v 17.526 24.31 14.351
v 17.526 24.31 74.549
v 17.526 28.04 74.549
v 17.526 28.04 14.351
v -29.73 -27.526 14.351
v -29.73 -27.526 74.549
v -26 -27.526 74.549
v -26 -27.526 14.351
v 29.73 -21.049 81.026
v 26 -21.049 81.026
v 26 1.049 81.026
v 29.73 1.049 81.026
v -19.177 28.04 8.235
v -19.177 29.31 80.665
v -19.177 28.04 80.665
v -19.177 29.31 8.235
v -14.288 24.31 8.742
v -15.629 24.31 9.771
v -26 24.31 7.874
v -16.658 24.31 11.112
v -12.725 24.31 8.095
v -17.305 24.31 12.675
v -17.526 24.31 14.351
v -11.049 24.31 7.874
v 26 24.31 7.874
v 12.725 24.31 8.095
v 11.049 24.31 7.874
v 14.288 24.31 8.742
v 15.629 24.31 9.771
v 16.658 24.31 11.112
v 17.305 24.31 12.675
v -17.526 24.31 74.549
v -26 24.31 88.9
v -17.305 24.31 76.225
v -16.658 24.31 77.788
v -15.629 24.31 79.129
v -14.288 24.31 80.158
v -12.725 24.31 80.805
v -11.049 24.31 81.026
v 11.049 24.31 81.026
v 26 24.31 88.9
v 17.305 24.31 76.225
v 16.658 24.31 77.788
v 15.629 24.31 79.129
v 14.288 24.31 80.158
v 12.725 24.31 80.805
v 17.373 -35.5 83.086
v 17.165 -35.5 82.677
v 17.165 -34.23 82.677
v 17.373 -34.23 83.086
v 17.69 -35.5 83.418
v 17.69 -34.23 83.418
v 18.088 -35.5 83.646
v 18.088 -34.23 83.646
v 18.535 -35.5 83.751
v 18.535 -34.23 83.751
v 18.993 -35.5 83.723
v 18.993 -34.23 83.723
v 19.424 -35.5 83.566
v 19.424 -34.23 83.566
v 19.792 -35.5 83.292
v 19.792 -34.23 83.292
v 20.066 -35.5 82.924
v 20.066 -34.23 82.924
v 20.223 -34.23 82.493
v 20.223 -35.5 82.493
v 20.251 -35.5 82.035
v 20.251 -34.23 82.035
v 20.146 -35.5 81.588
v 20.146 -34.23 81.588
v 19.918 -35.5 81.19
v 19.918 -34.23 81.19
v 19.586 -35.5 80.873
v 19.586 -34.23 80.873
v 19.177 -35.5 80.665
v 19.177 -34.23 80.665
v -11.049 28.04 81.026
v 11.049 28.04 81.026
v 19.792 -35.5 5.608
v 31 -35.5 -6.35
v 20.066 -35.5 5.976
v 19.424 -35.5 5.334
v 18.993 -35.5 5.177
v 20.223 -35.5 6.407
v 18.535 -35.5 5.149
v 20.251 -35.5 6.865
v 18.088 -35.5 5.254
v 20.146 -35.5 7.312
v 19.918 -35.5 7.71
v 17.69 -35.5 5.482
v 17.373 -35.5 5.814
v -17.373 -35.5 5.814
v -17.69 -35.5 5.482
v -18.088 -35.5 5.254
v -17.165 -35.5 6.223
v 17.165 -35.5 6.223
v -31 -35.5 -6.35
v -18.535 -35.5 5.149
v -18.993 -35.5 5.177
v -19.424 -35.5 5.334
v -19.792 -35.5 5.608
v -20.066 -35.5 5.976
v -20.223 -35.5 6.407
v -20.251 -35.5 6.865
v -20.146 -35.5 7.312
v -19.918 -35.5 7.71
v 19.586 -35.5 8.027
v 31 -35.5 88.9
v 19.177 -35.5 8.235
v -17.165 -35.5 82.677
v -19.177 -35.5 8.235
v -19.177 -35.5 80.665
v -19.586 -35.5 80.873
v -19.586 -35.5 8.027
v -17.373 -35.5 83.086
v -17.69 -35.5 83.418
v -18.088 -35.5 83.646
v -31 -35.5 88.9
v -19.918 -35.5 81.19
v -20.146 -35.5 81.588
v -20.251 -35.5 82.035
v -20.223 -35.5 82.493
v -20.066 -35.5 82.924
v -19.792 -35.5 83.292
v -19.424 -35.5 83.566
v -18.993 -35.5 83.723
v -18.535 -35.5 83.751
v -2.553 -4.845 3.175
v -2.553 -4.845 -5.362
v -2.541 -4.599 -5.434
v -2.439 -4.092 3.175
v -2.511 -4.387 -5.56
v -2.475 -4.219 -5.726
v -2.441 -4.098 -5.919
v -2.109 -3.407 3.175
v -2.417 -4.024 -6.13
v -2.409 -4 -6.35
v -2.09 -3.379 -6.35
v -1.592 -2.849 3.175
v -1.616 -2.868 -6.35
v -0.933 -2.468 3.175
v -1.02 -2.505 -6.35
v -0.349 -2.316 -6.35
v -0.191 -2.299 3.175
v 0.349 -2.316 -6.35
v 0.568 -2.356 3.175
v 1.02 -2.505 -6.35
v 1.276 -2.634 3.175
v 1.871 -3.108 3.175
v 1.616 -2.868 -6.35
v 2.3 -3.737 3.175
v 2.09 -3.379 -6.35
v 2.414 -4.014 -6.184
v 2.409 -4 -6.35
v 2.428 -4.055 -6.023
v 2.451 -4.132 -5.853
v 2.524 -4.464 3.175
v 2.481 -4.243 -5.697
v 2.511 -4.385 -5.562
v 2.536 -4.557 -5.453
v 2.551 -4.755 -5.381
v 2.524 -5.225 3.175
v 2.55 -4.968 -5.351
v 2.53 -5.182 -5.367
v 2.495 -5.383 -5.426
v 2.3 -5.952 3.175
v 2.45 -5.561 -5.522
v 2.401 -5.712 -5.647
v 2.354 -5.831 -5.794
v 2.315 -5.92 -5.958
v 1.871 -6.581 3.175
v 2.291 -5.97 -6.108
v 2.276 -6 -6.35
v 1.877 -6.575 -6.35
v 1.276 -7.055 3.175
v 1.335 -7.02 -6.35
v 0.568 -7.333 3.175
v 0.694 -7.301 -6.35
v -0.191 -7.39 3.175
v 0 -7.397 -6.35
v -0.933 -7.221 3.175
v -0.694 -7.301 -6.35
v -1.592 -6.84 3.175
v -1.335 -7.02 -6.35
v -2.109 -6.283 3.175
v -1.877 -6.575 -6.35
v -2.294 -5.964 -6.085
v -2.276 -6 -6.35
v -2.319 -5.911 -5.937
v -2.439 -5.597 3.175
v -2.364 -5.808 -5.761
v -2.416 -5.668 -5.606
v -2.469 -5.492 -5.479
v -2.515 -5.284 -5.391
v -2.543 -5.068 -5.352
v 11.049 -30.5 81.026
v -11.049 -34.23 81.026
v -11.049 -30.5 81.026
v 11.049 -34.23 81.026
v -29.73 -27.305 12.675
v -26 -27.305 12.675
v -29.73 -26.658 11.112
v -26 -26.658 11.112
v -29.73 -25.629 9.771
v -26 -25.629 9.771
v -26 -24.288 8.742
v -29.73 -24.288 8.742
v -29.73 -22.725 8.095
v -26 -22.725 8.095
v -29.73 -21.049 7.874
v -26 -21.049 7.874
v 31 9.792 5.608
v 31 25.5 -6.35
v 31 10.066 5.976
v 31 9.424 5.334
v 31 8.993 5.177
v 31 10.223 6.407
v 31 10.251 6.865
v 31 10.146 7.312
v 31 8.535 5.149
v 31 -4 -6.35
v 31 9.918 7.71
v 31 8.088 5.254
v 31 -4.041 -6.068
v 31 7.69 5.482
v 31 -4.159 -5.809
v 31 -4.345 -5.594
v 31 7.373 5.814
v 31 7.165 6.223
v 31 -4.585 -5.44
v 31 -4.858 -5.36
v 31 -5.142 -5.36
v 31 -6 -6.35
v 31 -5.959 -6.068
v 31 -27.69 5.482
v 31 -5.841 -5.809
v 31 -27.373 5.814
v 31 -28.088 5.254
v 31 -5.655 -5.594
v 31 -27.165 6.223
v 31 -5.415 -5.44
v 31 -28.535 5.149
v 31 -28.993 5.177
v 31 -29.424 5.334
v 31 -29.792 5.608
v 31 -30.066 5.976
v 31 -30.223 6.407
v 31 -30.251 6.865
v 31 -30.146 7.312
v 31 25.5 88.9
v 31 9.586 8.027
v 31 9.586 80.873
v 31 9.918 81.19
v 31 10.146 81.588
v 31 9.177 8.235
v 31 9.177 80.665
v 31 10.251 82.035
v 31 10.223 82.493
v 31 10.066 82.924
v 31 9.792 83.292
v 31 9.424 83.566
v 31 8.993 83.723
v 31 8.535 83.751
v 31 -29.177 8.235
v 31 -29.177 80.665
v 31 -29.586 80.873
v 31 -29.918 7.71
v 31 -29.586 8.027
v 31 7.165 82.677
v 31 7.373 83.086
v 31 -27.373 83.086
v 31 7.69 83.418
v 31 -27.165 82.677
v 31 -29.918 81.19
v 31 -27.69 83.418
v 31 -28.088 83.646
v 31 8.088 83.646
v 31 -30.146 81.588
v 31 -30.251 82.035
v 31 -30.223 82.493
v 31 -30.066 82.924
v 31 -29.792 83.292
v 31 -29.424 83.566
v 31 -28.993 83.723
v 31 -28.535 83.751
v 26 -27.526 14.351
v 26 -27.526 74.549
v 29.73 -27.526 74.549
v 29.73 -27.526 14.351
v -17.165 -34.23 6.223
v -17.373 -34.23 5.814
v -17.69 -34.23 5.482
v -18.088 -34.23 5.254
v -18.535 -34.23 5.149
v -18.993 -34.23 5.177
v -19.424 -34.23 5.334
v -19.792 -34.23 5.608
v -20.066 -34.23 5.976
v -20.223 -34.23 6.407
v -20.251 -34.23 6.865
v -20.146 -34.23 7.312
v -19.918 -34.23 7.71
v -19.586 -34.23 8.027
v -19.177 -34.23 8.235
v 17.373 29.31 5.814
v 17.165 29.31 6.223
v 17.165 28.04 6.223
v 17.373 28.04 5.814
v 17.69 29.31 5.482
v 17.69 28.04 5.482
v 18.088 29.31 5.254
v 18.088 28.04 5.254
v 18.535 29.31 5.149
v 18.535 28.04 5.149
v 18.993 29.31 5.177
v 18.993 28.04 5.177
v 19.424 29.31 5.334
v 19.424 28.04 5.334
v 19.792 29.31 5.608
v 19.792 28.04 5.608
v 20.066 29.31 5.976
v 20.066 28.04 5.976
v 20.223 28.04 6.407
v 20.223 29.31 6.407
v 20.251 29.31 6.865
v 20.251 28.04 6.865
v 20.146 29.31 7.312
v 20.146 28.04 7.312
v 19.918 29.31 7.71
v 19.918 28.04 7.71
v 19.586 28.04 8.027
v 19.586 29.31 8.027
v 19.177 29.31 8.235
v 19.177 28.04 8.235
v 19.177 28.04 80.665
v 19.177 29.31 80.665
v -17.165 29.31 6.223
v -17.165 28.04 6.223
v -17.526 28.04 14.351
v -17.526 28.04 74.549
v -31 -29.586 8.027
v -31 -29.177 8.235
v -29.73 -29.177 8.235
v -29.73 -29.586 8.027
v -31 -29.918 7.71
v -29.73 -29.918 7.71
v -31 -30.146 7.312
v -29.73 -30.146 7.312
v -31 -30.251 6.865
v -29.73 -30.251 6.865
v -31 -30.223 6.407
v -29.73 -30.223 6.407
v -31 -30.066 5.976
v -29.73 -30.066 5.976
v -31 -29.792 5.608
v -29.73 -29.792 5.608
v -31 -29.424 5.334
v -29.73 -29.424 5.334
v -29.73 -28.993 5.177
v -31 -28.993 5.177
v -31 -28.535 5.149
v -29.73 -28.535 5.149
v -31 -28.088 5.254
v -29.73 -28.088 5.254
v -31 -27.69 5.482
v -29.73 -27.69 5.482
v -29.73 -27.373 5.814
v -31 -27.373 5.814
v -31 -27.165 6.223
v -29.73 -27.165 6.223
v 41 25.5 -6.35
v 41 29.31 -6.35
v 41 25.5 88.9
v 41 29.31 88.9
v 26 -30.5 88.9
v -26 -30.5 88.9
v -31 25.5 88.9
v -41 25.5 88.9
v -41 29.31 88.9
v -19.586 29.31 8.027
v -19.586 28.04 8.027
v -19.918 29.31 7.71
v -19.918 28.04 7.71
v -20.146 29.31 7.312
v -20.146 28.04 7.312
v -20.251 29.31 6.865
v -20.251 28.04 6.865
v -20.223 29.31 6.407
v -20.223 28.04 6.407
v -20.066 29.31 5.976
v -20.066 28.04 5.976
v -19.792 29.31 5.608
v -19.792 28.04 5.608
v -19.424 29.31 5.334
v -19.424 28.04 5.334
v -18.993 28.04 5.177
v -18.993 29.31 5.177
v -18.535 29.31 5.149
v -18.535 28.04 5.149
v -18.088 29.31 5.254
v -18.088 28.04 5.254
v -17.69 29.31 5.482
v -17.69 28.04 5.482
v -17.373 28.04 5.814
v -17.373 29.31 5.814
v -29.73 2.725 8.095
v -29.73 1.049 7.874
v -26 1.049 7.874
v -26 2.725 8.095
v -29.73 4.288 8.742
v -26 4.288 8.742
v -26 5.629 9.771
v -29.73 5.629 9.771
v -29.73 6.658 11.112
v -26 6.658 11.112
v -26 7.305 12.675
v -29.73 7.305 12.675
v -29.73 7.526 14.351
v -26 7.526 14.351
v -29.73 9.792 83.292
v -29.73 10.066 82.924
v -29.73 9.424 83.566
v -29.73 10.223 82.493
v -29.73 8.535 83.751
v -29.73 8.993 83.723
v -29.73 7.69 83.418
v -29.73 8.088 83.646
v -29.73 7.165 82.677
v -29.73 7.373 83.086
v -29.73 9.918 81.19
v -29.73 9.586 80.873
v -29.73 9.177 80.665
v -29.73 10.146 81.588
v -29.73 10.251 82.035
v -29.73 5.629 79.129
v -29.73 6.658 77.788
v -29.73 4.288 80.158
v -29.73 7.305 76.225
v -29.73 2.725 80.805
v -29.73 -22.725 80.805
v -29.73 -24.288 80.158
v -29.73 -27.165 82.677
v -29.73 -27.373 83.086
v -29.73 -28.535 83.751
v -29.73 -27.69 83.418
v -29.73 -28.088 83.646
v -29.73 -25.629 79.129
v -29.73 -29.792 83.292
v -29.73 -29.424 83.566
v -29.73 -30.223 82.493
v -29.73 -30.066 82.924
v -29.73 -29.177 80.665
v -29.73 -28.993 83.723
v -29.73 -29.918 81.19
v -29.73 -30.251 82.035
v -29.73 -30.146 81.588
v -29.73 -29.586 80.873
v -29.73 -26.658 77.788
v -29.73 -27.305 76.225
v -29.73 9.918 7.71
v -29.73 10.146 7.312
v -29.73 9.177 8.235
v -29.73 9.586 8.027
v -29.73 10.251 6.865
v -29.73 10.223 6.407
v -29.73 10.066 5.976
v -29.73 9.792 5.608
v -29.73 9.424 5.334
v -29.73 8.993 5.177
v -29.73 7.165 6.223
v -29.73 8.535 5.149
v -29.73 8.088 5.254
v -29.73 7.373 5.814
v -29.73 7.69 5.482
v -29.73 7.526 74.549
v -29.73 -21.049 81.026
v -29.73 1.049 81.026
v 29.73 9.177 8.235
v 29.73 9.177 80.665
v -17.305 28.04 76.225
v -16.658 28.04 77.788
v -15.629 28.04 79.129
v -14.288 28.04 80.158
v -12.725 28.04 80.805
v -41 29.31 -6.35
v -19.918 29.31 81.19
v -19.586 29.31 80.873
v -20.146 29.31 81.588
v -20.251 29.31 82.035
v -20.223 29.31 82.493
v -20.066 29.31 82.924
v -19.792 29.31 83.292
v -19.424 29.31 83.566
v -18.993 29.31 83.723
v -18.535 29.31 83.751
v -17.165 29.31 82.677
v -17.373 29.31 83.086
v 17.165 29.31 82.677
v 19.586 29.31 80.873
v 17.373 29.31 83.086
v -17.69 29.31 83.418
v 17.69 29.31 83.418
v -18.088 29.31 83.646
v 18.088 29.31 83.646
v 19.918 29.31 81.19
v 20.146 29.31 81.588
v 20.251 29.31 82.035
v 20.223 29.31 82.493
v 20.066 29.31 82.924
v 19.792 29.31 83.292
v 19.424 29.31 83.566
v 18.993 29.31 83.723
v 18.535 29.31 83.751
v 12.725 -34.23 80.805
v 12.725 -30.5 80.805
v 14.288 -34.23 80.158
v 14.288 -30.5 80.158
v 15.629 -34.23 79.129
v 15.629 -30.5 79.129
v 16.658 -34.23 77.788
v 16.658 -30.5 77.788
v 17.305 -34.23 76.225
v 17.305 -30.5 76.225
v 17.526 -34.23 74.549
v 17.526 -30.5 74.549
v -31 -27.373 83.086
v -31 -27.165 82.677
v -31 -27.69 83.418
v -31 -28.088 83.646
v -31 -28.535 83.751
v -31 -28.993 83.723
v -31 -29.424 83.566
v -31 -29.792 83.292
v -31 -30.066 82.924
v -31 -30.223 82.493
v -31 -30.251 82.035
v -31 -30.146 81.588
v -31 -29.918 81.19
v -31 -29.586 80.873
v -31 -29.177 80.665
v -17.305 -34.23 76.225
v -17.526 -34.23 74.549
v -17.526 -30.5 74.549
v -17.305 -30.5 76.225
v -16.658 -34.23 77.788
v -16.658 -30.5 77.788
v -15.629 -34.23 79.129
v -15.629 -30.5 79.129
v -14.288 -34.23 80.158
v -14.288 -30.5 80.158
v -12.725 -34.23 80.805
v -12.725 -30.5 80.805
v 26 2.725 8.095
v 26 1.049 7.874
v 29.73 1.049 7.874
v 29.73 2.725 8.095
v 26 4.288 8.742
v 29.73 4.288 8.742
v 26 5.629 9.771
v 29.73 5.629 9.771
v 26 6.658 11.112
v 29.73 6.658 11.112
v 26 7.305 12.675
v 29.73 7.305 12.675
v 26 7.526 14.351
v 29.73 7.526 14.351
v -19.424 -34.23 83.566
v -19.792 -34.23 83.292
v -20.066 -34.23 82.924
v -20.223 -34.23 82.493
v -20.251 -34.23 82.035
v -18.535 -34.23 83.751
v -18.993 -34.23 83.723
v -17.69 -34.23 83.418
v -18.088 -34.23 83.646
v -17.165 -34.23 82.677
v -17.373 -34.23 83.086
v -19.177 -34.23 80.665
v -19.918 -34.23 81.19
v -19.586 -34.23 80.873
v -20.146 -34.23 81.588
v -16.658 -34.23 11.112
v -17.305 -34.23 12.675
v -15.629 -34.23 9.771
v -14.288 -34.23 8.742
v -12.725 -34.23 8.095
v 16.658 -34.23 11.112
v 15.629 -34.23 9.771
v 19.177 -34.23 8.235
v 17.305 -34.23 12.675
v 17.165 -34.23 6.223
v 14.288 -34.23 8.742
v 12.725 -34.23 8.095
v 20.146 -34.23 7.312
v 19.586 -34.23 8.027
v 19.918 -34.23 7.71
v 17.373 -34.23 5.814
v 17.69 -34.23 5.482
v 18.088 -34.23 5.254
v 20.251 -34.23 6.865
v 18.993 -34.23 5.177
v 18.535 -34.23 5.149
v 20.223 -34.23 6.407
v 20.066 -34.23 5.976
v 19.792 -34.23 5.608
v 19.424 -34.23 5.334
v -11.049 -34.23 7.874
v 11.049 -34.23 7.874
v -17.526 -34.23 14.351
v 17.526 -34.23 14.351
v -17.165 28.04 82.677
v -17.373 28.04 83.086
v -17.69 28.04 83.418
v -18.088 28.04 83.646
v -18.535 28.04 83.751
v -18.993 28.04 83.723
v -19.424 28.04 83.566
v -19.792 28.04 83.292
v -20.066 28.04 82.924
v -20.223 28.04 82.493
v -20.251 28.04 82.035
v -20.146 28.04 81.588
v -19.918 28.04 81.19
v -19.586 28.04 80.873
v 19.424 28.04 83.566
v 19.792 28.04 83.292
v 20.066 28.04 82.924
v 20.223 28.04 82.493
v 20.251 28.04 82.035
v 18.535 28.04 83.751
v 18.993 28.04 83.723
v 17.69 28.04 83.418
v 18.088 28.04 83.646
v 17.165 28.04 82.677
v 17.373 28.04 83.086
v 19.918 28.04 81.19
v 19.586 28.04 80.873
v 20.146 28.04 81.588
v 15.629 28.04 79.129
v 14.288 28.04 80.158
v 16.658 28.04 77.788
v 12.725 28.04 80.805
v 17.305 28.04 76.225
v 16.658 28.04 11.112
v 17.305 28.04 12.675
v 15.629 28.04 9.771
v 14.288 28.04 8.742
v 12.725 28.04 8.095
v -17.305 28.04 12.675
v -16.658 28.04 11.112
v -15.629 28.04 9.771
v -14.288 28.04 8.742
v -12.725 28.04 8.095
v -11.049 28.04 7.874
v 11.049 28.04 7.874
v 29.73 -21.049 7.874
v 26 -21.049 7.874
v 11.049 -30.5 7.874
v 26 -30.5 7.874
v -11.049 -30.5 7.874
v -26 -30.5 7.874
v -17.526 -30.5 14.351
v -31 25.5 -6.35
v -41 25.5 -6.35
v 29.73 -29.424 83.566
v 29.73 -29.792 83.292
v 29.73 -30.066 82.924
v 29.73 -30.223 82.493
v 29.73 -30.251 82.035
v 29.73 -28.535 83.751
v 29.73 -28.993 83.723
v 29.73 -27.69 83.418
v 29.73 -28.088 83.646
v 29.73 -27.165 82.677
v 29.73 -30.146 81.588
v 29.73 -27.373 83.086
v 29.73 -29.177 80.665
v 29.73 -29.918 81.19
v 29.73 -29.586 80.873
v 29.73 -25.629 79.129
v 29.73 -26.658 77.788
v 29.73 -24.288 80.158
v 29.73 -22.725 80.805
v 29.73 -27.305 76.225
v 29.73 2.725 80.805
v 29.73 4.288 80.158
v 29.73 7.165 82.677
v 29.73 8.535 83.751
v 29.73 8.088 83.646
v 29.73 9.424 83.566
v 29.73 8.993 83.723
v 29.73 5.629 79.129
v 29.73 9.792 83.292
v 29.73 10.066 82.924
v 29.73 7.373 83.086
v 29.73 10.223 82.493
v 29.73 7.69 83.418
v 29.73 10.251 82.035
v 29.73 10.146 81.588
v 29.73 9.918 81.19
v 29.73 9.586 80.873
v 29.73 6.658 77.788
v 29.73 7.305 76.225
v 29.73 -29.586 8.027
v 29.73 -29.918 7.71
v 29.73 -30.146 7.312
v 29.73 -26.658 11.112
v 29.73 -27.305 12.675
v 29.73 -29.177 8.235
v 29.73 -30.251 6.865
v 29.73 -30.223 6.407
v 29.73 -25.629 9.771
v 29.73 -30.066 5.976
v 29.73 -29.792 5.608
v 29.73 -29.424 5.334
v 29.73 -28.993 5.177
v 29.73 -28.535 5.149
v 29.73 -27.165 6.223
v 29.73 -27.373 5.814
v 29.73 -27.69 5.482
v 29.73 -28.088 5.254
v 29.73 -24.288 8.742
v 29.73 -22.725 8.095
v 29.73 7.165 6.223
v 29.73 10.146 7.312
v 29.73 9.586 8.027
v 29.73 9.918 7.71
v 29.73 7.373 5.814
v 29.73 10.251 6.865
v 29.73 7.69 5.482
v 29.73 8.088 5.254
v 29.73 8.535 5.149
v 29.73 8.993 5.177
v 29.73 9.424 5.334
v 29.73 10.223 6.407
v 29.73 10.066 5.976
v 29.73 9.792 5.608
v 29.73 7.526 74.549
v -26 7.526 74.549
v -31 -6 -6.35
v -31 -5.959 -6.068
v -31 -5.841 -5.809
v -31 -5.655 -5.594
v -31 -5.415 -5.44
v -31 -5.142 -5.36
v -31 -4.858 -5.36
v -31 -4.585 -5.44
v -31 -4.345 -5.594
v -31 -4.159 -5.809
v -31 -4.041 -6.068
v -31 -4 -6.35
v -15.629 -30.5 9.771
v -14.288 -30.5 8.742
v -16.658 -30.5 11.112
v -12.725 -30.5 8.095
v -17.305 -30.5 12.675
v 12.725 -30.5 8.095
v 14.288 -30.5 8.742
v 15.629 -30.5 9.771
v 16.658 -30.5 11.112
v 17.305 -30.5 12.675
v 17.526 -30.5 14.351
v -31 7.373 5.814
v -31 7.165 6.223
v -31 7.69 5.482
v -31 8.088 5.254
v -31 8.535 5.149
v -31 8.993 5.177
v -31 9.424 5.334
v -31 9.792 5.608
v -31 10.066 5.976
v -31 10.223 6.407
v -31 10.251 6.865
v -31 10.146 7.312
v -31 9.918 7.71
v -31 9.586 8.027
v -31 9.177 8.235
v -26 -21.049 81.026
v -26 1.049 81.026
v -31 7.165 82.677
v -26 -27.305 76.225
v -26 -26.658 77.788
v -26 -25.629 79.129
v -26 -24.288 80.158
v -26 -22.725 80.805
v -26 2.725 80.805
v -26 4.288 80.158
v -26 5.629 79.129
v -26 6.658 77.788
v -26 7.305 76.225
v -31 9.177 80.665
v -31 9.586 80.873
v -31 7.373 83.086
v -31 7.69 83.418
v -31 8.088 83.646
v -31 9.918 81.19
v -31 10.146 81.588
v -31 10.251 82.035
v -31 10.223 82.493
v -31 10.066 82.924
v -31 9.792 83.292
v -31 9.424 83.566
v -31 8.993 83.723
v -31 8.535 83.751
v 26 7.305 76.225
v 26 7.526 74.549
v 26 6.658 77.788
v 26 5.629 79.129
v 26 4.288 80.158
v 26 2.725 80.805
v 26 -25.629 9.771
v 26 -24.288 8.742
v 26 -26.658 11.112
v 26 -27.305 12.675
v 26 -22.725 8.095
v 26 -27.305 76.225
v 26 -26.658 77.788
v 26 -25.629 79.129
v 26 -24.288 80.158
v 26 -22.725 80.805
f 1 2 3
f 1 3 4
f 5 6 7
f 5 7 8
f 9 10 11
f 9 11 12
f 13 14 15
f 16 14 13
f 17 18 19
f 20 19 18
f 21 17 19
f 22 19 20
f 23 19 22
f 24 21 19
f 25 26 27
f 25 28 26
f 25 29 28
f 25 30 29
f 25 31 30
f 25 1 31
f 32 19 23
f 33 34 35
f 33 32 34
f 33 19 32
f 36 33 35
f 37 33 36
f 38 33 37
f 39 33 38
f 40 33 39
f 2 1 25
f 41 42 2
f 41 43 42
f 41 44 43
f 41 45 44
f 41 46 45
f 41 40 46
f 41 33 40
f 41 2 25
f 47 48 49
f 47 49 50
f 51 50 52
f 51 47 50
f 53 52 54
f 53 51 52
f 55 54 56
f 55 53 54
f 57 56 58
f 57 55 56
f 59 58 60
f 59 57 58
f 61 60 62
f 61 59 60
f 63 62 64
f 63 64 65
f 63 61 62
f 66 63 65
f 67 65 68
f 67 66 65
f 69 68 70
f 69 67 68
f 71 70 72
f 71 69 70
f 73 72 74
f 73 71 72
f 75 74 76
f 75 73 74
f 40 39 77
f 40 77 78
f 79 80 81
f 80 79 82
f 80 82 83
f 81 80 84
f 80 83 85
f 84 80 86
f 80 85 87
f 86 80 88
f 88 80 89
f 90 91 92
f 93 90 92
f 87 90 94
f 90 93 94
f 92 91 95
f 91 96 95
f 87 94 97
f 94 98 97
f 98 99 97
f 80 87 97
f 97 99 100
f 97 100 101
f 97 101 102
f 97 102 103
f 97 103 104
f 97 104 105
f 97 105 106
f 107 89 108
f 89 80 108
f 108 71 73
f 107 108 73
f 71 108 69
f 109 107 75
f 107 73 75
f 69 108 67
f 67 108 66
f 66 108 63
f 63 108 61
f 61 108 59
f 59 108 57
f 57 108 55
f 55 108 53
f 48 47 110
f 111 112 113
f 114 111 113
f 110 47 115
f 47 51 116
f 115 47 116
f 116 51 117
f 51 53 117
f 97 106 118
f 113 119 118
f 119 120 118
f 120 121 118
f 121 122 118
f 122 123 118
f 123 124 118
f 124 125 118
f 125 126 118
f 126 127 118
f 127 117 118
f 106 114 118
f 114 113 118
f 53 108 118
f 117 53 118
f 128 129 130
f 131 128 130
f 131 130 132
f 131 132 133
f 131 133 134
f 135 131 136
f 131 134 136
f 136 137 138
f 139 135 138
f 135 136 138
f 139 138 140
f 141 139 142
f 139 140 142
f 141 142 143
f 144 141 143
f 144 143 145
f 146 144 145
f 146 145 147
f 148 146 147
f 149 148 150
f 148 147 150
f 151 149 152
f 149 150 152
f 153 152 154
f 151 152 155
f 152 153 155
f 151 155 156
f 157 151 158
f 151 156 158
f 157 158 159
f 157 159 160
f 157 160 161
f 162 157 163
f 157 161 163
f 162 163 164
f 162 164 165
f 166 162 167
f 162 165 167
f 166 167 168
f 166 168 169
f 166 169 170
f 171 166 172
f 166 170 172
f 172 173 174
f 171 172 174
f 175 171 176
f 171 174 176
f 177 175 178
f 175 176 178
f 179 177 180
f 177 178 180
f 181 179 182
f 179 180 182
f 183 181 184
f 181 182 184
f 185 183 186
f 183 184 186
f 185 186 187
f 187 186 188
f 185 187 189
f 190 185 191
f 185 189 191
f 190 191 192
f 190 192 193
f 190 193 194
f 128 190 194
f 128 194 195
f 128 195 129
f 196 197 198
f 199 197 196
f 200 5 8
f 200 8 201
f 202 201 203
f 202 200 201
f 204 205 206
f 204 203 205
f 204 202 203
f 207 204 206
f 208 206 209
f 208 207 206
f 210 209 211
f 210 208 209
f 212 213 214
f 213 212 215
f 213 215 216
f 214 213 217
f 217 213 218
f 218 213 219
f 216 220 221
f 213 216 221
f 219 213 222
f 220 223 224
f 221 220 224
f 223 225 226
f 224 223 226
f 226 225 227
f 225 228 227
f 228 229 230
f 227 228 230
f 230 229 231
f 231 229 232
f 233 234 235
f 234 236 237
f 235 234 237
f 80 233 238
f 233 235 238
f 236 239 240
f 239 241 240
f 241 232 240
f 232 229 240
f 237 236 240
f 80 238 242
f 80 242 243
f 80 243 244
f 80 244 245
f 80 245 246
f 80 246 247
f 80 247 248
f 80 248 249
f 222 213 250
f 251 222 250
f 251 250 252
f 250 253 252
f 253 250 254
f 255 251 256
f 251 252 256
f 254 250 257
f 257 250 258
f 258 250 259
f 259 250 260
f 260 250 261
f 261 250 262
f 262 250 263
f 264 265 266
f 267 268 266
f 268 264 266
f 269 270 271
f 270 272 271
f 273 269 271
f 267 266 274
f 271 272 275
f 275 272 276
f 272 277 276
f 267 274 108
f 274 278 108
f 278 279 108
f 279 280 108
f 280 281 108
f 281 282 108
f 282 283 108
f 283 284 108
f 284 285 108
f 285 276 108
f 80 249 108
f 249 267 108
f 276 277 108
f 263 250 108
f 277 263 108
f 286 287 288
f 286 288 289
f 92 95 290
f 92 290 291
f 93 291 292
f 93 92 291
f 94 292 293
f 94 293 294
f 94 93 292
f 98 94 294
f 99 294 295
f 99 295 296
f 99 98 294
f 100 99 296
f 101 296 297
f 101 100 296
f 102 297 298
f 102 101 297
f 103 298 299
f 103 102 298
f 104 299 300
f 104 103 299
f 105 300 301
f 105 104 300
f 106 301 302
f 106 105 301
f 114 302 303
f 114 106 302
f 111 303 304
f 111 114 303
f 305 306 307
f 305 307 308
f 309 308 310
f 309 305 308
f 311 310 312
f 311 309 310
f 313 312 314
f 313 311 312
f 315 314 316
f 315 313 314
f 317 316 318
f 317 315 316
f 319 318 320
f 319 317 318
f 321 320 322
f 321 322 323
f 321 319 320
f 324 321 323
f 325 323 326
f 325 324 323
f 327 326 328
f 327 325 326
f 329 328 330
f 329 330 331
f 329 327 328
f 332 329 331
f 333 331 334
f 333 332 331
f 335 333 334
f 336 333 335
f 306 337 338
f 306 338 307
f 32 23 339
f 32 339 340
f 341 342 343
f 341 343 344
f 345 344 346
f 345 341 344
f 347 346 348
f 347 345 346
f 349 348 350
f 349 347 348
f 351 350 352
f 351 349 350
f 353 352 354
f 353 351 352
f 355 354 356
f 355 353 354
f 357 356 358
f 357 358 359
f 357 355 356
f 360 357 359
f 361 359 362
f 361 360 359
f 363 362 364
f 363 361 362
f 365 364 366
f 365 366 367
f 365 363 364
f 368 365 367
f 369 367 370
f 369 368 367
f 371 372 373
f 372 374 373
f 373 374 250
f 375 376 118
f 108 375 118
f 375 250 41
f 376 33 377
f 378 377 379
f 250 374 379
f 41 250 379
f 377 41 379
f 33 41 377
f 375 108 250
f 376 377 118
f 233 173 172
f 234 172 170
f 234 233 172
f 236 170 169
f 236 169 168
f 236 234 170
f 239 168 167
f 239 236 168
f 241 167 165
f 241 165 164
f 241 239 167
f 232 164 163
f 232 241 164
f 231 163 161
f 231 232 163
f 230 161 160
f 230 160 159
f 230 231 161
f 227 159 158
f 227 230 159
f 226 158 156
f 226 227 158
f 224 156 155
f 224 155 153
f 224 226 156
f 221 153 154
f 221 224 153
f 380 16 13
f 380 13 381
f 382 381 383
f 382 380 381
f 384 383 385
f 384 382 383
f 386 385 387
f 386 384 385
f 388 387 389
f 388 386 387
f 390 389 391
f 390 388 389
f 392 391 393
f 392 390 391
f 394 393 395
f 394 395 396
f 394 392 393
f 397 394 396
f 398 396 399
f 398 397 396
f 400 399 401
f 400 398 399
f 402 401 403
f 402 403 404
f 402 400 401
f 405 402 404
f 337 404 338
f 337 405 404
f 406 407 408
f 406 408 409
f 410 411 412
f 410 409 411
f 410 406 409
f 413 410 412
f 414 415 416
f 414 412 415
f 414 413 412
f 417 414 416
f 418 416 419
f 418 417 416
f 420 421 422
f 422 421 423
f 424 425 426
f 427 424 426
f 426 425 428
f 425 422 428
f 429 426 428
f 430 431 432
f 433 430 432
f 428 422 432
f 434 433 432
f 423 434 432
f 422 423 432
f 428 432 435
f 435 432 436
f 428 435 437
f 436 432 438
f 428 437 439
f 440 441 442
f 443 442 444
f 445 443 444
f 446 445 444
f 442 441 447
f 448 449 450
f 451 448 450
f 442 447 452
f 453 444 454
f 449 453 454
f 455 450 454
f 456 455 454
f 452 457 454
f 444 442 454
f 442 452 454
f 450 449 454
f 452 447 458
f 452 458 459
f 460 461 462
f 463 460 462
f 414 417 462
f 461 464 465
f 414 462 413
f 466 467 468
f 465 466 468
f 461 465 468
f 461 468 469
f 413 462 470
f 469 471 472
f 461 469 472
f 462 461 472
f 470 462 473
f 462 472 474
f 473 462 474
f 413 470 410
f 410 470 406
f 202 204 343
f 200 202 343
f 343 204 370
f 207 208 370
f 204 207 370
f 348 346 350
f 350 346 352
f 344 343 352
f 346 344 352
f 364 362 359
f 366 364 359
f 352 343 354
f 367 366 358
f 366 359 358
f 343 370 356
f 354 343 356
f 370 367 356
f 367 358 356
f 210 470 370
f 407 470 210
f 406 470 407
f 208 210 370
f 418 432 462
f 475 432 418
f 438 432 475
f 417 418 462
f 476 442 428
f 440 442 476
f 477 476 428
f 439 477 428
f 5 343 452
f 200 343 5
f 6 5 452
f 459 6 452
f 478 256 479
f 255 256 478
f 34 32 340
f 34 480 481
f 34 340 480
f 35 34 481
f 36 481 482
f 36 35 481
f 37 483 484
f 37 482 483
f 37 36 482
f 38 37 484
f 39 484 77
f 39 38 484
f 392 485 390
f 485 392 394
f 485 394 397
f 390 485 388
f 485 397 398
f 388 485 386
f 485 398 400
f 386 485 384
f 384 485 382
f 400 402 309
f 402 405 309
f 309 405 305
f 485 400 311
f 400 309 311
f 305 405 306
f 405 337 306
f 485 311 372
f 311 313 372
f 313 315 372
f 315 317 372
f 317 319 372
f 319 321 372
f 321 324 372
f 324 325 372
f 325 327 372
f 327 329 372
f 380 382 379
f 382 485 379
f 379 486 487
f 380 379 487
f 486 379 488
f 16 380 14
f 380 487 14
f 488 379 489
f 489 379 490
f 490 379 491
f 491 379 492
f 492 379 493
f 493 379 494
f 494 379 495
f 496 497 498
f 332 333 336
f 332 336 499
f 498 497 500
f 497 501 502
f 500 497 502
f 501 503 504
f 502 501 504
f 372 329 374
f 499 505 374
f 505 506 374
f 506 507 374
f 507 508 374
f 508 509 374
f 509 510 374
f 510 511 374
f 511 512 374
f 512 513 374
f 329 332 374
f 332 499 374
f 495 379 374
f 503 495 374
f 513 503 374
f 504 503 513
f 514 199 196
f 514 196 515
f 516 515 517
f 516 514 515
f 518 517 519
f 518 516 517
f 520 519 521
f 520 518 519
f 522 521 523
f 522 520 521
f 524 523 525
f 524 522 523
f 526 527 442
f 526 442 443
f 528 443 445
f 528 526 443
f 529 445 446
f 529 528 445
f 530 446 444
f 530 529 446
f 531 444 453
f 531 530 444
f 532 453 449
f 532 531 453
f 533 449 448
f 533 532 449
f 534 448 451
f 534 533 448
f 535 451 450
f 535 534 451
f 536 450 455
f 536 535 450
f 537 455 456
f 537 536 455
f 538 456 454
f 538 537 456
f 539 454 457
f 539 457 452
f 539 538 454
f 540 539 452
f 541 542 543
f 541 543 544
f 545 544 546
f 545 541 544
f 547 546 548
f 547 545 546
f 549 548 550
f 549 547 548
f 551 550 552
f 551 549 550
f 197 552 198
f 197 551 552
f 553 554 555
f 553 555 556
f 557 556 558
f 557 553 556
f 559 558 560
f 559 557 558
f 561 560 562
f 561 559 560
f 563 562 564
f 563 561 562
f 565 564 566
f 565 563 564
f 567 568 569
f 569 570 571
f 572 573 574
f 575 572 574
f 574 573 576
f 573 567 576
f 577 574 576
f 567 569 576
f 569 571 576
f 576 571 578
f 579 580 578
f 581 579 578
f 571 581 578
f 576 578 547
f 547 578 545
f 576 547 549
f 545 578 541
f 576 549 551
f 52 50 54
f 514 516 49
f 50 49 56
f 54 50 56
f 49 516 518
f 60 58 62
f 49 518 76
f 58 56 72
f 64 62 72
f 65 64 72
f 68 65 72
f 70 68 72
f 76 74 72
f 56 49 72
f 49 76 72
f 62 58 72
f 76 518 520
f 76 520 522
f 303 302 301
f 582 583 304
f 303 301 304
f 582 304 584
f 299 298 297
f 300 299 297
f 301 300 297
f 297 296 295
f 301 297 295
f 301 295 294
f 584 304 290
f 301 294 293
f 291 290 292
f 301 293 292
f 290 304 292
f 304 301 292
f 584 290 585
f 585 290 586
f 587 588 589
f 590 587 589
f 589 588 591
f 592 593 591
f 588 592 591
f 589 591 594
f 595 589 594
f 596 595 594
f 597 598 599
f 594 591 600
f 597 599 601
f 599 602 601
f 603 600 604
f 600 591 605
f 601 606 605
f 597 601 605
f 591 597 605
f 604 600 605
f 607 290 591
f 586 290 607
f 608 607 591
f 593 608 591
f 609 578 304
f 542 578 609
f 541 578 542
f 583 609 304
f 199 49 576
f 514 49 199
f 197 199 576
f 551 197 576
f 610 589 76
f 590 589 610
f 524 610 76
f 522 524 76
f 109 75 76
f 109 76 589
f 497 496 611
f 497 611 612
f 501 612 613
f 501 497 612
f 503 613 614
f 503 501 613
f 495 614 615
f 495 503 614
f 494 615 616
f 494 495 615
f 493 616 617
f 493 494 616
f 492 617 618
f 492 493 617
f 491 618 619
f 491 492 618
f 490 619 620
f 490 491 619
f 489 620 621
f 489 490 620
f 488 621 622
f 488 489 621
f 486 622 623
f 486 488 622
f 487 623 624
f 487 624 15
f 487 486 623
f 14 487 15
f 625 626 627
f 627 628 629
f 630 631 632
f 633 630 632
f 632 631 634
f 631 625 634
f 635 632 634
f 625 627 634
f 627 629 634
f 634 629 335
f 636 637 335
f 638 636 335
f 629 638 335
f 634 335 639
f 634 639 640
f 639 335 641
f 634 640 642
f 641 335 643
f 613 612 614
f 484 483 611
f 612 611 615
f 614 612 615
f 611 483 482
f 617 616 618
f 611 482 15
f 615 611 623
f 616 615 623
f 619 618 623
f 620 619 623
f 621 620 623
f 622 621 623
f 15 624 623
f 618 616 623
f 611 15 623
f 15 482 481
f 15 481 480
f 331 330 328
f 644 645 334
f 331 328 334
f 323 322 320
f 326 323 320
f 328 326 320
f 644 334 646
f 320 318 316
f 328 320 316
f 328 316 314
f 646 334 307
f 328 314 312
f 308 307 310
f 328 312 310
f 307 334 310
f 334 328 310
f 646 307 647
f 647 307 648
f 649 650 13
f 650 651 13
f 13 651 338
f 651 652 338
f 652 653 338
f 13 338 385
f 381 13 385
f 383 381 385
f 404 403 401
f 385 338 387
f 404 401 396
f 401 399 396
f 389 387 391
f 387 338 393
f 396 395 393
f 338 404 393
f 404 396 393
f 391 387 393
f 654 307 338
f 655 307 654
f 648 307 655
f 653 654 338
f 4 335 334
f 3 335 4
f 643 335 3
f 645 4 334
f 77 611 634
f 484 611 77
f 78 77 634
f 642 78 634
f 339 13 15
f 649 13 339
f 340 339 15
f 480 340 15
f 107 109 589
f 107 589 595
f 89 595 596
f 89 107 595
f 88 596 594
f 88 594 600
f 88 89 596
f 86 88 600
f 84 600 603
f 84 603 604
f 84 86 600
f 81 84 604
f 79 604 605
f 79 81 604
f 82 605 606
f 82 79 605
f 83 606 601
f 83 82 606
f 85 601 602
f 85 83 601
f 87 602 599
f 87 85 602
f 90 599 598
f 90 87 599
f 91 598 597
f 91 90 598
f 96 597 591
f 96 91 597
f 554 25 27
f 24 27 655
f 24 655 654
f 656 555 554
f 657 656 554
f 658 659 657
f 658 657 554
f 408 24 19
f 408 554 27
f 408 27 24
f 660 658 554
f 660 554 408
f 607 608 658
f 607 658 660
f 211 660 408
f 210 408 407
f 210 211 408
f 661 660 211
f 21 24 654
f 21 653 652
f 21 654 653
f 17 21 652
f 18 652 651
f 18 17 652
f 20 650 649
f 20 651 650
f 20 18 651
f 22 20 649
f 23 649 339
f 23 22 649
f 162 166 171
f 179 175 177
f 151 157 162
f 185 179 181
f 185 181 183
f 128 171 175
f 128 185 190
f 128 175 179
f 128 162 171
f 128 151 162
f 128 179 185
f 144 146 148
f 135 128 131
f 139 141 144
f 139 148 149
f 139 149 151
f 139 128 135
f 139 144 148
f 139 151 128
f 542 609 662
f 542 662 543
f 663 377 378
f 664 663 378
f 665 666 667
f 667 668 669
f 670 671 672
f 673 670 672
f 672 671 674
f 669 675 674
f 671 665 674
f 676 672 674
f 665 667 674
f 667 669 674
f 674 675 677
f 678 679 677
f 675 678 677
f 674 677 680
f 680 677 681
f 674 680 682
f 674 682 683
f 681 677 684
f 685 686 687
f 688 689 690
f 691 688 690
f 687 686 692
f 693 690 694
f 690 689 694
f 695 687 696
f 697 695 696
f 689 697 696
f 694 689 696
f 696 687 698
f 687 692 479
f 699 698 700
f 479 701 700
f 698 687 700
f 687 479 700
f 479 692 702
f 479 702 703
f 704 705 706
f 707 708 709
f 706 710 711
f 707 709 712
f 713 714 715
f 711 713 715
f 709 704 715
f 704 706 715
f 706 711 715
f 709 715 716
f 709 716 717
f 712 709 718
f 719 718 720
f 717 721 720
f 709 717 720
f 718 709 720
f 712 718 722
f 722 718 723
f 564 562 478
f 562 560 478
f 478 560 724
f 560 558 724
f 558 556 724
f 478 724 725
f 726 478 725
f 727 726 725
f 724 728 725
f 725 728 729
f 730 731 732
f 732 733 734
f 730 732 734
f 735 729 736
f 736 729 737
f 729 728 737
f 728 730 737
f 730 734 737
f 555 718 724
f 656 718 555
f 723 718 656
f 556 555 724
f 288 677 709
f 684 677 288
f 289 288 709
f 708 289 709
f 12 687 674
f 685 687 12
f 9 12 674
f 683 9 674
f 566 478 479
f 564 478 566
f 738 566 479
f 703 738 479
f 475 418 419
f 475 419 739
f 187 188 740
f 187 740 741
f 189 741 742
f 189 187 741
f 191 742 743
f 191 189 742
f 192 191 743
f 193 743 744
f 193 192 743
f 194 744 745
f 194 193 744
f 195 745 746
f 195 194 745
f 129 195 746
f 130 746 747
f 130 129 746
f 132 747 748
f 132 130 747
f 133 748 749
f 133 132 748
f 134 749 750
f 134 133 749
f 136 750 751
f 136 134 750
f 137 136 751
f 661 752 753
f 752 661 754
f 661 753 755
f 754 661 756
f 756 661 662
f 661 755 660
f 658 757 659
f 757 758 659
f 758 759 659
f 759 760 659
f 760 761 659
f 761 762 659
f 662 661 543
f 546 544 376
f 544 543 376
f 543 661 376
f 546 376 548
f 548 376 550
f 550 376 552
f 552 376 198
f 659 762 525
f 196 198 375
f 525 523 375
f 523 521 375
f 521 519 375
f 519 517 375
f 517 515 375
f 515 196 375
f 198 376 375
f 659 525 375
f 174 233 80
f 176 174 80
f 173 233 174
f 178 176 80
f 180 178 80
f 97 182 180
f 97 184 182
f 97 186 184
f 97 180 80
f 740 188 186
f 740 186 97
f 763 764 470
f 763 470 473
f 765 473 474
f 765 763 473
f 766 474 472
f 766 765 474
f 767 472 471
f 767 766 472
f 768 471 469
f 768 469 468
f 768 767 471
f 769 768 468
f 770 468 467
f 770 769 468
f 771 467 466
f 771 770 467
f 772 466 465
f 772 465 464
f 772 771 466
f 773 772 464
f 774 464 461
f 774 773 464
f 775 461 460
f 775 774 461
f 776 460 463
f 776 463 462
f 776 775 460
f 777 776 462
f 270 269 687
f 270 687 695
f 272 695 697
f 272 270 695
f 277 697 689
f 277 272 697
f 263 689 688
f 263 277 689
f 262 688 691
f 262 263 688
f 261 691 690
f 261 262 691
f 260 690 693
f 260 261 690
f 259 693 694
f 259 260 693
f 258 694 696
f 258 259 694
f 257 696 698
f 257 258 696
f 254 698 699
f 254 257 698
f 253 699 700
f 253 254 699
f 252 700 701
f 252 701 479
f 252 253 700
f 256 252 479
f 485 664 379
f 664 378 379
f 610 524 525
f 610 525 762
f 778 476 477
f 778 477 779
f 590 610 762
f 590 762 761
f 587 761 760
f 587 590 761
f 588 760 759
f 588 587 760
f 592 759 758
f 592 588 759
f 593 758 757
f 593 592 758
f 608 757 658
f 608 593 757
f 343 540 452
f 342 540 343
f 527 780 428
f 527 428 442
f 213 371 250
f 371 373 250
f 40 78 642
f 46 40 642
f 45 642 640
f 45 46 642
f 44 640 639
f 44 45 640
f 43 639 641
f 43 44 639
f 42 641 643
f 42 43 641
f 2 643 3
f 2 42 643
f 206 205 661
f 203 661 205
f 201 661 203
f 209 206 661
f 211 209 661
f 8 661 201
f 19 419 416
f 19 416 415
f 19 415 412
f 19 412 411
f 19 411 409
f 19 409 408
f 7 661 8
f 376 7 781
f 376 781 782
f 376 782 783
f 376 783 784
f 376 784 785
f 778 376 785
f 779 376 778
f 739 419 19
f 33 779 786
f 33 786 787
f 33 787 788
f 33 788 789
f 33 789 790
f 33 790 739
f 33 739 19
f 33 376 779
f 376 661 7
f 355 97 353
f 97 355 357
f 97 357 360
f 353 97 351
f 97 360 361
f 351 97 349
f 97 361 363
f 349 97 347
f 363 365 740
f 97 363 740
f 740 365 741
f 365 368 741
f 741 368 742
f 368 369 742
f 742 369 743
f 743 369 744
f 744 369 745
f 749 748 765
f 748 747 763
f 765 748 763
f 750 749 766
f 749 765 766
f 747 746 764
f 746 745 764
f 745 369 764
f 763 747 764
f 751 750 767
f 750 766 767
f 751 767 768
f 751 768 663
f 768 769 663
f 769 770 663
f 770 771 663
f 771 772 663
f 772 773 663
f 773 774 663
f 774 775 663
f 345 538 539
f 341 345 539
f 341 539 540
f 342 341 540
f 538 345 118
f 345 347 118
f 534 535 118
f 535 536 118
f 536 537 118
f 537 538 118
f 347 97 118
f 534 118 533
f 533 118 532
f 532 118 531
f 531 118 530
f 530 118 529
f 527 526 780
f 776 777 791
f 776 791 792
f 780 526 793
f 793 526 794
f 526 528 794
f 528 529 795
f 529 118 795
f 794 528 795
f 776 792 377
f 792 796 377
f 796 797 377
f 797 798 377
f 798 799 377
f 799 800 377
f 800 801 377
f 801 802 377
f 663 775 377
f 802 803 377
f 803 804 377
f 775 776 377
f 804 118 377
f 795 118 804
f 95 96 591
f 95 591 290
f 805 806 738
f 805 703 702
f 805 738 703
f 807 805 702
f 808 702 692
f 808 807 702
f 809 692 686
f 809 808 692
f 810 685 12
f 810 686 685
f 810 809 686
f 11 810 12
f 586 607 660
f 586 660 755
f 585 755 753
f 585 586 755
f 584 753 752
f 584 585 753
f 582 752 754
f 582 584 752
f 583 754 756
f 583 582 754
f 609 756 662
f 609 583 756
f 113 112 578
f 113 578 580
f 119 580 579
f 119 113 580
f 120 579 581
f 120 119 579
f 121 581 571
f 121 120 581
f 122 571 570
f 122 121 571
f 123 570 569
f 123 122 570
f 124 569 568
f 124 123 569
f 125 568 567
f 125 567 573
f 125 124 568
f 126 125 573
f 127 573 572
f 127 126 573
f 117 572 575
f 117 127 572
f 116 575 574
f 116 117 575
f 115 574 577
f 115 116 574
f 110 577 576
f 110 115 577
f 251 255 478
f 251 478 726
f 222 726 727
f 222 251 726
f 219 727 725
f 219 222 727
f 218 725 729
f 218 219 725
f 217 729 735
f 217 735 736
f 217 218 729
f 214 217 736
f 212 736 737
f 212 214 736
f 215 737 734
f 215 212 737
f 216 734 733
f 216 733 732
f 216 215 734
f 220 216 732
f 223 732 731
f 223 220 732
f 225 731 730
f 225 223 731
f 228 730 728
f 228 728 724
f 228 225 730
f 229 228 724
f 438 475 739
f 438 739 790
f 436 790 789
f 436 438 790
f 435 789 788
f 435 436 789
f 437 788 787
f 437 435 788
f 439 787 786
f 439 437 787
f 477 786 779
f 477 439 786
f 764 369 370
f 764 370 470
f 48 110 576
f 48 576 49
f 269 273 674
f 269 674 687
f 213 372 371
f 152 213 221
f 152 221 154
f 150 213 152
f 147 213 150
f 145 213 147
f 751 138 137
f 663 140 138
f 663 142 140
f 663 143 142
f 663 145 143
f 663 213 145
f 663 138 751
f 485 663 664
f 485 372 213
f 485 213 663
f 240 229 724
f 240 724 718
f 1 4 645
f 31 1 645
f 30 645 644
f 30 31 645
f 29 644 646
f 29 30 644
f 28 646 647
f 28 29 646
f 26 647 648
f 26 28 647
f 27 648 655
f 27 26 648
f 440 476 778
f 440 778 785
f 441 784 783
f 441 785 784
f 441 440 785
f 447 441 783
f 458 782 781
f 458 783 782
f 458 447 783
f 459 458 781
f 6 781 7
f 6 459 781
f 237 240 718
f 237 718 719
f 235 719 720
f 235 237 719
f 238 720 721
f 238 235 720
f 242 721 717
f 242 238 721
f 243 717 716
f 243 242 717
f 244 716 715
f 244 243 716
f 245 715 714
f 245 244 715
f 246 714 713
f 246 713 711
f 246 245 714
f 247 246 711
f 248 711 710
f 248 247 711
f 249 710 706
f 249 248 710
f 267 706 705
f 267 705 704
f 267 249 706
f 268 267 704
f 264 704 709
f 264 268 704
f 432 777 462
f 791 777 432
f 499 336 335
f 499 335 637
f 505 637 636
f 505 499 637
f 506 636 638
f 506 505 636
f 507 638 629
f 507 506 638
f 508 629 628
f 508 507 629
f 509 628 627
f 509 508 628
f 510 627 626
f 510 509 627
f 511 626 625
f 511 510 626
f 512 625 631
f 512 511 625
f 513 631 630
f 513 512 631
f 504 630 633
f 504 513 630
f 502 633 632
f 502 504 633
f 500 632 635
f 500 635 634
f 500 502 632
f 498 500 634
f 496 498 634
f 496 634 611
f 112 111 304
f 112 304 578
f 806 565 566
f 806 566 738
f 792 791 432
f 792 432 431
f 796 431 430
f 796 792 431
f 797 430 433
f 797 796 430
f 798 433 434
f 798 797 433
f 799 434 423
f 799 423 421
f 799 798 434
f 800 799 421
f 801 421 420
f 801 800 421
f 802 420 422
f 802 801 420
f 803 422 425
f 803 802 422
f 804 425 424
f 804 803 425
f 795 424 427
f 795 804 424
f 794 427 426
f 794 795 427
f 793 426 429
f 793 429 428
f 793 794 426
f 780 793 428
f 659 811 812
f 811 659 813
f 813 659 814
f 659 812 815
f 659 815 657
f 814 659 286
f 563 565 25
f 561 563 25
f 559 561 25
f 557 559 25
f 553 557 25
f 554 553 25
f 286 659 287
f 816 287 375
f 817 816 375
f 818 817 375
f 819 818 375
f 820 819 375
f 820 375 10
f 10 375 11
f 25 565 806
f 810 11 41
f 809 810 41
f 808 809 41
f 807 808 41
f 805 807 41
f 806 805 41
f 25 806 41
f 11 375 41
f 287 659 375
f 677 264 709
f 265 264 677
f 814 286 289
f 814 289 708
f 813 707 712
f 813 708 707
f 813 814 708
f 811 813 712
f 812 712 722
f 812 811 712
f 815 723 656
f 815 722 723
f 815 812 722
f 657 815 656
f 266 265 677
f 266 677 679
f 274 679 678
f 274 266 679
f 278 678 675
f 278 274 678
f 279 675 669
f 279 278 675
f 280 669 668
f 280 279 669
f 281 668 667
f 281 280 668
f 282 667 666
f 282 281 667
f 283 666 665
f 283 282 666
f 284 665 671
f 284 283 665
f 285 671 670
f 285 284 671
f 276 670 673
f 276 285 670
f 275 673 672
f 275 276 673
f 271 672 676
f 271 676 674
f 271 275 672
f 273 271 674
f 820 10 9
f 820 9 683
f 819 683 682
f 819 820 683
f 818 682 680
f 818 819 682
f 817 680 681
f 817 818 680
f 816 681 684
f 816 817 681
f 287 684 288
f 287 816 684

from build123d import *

# Parameters (mm, degrees)
BOSS_EXTRUDE1_DEPTH = 88.9
CUT_EXTRUDE5_DEPTH  = 73
CUT_EXTRUDE6_DEPTH  = 65.81
SKETCH8_W           = 52
SKETCH8_H           = 54.81
CUT_EXTRUDE7_DEPTH  = 15.875
SKETCH12_W          = 52
SKETCH12_H          = 54.81
CUT_EXTRUDE11_DEPTH = 63.5
SKETCH18_W          = 52
SKETCH18_H          = 54.81
CUT_EXTRUDE14_DEPTH = 81.026
BOSS_EXTRUDE2_DEPTH = 6.35
SKETCH20_R          = 2.5527
CUT_EXTRUDE15_DEPTH = 9.525
CUT_EXTRUDE16_DEPTH = 73
CUT_EXTRUDE17_DEPTH = 1.27
CUT_EXTRUDE18_DEPTH = 1.27
CUT_EXTRUDE19_DEPTH = 1.27
CUT_EXTRUDE20_DEPTH = 1.27


with BuildPart() as part:
    # Sketch1 → Boss-Extrude1 (new body)
    with BuildSketch(Plane.XY):
        Polygon((-41, 29.31), (41, 29.31), (41, 25.5), (31, 25.5), (31, -35.5), (-31, -35.5), (-31, 25.5), (-41, 25.5), align=None)
    extrude(amount=BOSS_EXTRUDE1_DEPTH)

    # Sketch6 → Cut-Extrude5 (cut, through all)
    with BuildSketch(Plane.ZY.offset(31)):
        with BuildLine():
            Line((14.351, 7.526), (74.549, 7.526))
            ThreePointArc((74.549, 7.526), (79.128930622, 5.628930622), (81.026, 1.049))
            Line((81.026, 1.049), (81.026, -21.049))
            ThreePointArc((81.026, -21.049), (79.128930622, -25.628930622), (74.549, -27.526))
            Line((74.549, -27.526), (14.351, -27.526))
            ThreePointArc((14.351, -27.526), (9.771069378, -25.628930622), (7.874, -21.049))
            Line((7.874, -21.049), (7.874, 1.049))
            ThreePointArc((7.874, 1.049), (9.771069378, 5.628930622), (14.351, 7.526))
        make_face()
    extrude(amount=-CUT_EXTRUDE5_DEPTH, mode=Mode.SUBTRACT)

    # Sketch7 → Cut-Extrude6 (cut, through all)
    with BuildSketch(Plane(origin=(0, -35.5, 0), x_dir=(0, 0, 1), z_dir=(0, -1, 0))):
        with BuildLine():
            Line((14.351, 17.526), (74.549, 17.526))
            ThreePointArc((74.549, 17.526), (79.128930622, 15.628930622), (81.026, 11.049))
            Line((81.026, 11.049), (81.026, -11.049))
            ThreePointArc((81.026, -11.049), (79.128930622, -15.628930622), (74.549, -17.526))
            Line((74.549, -17.526), (14.351, -17.526))
            ThreePointArc((14.351, -17.526), (9.771069378, -15.628930622), (7.874, -11.049))
            Line((7.874, -11.049), (7.874, 11.049))
            ThreePointArc((7.874, 11.049), (9.771069378, 15.628930622), (14.351, 17.526))
        make_face()
    extrude(amount=-CUT_EXTRUDE6_DEPTH, mode=Mode.SUBTRACT)

    # Sketch8 → Cut-Extrude7 (cut)
    with BuildSketch(Plane.XY.offset(88.9)):
        with Locations((0, -3.095)):
            Rectangle(SKETCH8_W, SKETCH8_H)
    extrude(amount=-CUT_EXTRUDE7_DEPTH, mode=Mode.SUBTRACT)

    # Sketch12 → Cut-Extrude11 (cut)
    with BuildSketch(Plane.XY.offset(88.9)):
        with Locations((0, -3.095)):
            Rectangle(SKETCH12_W, SKETCH12_H)
    extrude(amount=-CUT_EXTRUDE11_DEPTH, mode=Mode.SUBTRACT)

    # Sketch18 → Cut-Extrude14 (cut)
    with BuildSketch(Plane.XY.offset(88.9)):
        with Locations((0, -3.095)):
            Rectangle(SKETCH18_W, SKETCH18_H)
    extrude(amount=-CUT_EXTRUDE14_DEPTH, mode=Mode.SUBTRACT)

    # Sketch19 → Boss-Extrude2 (add)
    with BuildSketch(Plane(origin=(0, 0, 0), x_dir=(-1, 0, 0), z_dir=(0, 0, -1))):
        Polygon((31, 25.5), (41, 25.5), (41, 29.31), (-41, 29.31), (-41, 25.5), (-31, 25.5), (-31, -35.5), (31, -35.5), align=None)
    extrude(amount=BOSS_EXTRUDE2_DEPTH)

    # Sketch20 → Cut-Extrude15 (cut)
    with BuildSketch(Plane(origin=(0, 0, -6.35), x_dir=(-1, 0, 0), z_dir=(0, 0, -1))):
        with Locations((0, -4.844639258)):
            Circle(SKETCH20_R)
    extrude(amount=-CUT_EXTRUDE15_DEPTH, mode=Mode.SUBTRACT)

    # Sketch21 → Cut-Extrude16 (cut, through all)
    with BuildSketch(Plane(origin=(31, 0, 0), x_dir=(0, 0, -1), z_dir=(1, 0, 0))):
        with BuildLine():
            Line((6.35, -4), (6.35, -6))
            ThreePointArc((6.35, -6), (5.35, -5), (6.35, -4))
        make_face()
    extrude(amount=-CUT_EXTRUDE16_DEPTH, mode=Mode.SUBTRACT)

    # Sketch22 → Cut-Extrude17 (cut)
    with BuildSketch(Plane(origin=(0, -35.5, 0), x_dir=(-1, 0, 0), z_dir=(0, -1, 0))):
        with BuildLine():
            Line((-17.164974651, -6.223), (17.164974651, -6.223))
            ThreePointArc((17.164974651, -6.223), (19.791532015, -5.608467985), (19.177, -8.235025349))
            Line((19.177, -8.235025349), (19.177, -80.664974651))
            ThreePointArc((19.177, -80.664974651), (19.791532015, -83.291532015), (17.164974651, -82.677))
            Line((17.164974651, -82.677), (-17.164974651, -82.677))
            ThreePointArc((-17.164974651, -82.677), (-19.791532015, -83.291532015), (-19.177, -80.664974651))
            Line((-19.177, -80.664974651), (-19.177, -8.235025349))
            ThreePointArc((-19.177, -8.235025349), (-19.791532015, -5.608467985), (-17.164974651, -6.223))
        make_face()
    extrude(amount=-CUT_EXTRUDE17_DEPTH, mode=Mode.SUBTRACT)

    # Sketch23 → Cut-Extrude18 (cut)
    with BuildSketch(Plane(origin=(-31, 0, 0), x_dir=(0, 1, 0), z_dir=(-1, 0, 0))):
        with BuildLine():
            Line((-27.164974651, -6.223), (7.164974651, -6.223))
            ThreePointArc((7.164974651, -6.223), (9.791532015, -5.608467985), (9.177, -8.235025349))
            Line((9.177, -8.235025349), (9.177, -80.664974651))
            ThreePointArc((9.177, -80.664974651), (9.791532015, -83.291532015), (7.164974651, -82.677))
            Line((7.164974651, -82.677), (-27.164974651, -82.677))
            ThreePointArc((-27.164974651, -82.677), (-29.791532015, -83.291532015), (-29.177, -80.664974651))
            Line((-29.177, -80.664974651), (-29.177, -8.235025349))
            ThreePointArc((-29.177, -8.235025349), (-29.791532015, -5.608467985), (-27.164974651, -6.223))
        make_face()
    extrude(amount=-CUT_EXTRUDE18_DEPTH, mode=Mode.SUBTRACT)

    # Sketch24 → Cut-Extrude19 (cut)
    with BuildSketch(Plane(origin=(31, 0, 0), x_dir=(0, -1, 0), z_dir=(1, 0, 0))):
        with BuildLine():
            Line((-7.164974651, -6.223), (27.164974651, -6.223))
            ThreePointArc((27.164974651, -6.223), (29.791532015, -5.608467985), (29.177, -8.235025349))
            Line((29.177, -8.235025349), (29.177, -80.664974651))
            ThreePointArc((29.177, -80.664974651), (29.791532015, -83.291532015), (27.164974651, -82.677))
            Line((27.164974651, -82.677), (-7.164974651, -82.677))
            ThreePointArc((-7.164974651, -82.677), (-9.791532015, -83.291532015), (-9.177, -80.664974651))
            Line((-9.177, -80.664974651), (-9.177, -8.235025349))
            ThreePointArc((-9.177, -8.235025349), (-9.791532015, -5.608467985), (-7.164974651, -6.223))
        make_face()
    extrude(amount=-CUT_EXTRUDE19_DEPTH, mode=Mode.SUBTRACT)

    # Sketch25 → Cut-Extrude20 (cut)
    with BuildSketch(Plane(origin=(0, 29.31, 0), x_dir=(1, 0, 0), z_dir=(0, 1, 0))):
        with BuildLine():
            Line((-17.164974651, -6.223), (17.164974651, -6.223))
            ThreePointArc((17.164974651, -6.223), (19.791532015, -5.608467985), (19.177, -8.235025349))
            Line((19.177, -8.235025349), (19.177, -80.664974651))
            ThreePointArc((19.177, -80.664974651), (19.791532015, -83.291532015), (17.164974651, -82.677))
            Line((17.164974651, -82.677), (-17.164974651, -82.677))
            ThreePointArc((-17.164974651, -82.677), (-19.791532015, -83.291532015), (-19.177, -80.664974651))
            Line((-19.177, -80.664974651), (-19.177, -8.235025349))
            ThreePointArc((-19.177, -8.235025349), (-19.791532015, -5.608467985), (-17.164974651, -6.223))
        make_face()
    extrude(amount=-CUT_EXTRUDE20_DEPTH, mode=Mode.SUBTRACT)


solid = part.part
